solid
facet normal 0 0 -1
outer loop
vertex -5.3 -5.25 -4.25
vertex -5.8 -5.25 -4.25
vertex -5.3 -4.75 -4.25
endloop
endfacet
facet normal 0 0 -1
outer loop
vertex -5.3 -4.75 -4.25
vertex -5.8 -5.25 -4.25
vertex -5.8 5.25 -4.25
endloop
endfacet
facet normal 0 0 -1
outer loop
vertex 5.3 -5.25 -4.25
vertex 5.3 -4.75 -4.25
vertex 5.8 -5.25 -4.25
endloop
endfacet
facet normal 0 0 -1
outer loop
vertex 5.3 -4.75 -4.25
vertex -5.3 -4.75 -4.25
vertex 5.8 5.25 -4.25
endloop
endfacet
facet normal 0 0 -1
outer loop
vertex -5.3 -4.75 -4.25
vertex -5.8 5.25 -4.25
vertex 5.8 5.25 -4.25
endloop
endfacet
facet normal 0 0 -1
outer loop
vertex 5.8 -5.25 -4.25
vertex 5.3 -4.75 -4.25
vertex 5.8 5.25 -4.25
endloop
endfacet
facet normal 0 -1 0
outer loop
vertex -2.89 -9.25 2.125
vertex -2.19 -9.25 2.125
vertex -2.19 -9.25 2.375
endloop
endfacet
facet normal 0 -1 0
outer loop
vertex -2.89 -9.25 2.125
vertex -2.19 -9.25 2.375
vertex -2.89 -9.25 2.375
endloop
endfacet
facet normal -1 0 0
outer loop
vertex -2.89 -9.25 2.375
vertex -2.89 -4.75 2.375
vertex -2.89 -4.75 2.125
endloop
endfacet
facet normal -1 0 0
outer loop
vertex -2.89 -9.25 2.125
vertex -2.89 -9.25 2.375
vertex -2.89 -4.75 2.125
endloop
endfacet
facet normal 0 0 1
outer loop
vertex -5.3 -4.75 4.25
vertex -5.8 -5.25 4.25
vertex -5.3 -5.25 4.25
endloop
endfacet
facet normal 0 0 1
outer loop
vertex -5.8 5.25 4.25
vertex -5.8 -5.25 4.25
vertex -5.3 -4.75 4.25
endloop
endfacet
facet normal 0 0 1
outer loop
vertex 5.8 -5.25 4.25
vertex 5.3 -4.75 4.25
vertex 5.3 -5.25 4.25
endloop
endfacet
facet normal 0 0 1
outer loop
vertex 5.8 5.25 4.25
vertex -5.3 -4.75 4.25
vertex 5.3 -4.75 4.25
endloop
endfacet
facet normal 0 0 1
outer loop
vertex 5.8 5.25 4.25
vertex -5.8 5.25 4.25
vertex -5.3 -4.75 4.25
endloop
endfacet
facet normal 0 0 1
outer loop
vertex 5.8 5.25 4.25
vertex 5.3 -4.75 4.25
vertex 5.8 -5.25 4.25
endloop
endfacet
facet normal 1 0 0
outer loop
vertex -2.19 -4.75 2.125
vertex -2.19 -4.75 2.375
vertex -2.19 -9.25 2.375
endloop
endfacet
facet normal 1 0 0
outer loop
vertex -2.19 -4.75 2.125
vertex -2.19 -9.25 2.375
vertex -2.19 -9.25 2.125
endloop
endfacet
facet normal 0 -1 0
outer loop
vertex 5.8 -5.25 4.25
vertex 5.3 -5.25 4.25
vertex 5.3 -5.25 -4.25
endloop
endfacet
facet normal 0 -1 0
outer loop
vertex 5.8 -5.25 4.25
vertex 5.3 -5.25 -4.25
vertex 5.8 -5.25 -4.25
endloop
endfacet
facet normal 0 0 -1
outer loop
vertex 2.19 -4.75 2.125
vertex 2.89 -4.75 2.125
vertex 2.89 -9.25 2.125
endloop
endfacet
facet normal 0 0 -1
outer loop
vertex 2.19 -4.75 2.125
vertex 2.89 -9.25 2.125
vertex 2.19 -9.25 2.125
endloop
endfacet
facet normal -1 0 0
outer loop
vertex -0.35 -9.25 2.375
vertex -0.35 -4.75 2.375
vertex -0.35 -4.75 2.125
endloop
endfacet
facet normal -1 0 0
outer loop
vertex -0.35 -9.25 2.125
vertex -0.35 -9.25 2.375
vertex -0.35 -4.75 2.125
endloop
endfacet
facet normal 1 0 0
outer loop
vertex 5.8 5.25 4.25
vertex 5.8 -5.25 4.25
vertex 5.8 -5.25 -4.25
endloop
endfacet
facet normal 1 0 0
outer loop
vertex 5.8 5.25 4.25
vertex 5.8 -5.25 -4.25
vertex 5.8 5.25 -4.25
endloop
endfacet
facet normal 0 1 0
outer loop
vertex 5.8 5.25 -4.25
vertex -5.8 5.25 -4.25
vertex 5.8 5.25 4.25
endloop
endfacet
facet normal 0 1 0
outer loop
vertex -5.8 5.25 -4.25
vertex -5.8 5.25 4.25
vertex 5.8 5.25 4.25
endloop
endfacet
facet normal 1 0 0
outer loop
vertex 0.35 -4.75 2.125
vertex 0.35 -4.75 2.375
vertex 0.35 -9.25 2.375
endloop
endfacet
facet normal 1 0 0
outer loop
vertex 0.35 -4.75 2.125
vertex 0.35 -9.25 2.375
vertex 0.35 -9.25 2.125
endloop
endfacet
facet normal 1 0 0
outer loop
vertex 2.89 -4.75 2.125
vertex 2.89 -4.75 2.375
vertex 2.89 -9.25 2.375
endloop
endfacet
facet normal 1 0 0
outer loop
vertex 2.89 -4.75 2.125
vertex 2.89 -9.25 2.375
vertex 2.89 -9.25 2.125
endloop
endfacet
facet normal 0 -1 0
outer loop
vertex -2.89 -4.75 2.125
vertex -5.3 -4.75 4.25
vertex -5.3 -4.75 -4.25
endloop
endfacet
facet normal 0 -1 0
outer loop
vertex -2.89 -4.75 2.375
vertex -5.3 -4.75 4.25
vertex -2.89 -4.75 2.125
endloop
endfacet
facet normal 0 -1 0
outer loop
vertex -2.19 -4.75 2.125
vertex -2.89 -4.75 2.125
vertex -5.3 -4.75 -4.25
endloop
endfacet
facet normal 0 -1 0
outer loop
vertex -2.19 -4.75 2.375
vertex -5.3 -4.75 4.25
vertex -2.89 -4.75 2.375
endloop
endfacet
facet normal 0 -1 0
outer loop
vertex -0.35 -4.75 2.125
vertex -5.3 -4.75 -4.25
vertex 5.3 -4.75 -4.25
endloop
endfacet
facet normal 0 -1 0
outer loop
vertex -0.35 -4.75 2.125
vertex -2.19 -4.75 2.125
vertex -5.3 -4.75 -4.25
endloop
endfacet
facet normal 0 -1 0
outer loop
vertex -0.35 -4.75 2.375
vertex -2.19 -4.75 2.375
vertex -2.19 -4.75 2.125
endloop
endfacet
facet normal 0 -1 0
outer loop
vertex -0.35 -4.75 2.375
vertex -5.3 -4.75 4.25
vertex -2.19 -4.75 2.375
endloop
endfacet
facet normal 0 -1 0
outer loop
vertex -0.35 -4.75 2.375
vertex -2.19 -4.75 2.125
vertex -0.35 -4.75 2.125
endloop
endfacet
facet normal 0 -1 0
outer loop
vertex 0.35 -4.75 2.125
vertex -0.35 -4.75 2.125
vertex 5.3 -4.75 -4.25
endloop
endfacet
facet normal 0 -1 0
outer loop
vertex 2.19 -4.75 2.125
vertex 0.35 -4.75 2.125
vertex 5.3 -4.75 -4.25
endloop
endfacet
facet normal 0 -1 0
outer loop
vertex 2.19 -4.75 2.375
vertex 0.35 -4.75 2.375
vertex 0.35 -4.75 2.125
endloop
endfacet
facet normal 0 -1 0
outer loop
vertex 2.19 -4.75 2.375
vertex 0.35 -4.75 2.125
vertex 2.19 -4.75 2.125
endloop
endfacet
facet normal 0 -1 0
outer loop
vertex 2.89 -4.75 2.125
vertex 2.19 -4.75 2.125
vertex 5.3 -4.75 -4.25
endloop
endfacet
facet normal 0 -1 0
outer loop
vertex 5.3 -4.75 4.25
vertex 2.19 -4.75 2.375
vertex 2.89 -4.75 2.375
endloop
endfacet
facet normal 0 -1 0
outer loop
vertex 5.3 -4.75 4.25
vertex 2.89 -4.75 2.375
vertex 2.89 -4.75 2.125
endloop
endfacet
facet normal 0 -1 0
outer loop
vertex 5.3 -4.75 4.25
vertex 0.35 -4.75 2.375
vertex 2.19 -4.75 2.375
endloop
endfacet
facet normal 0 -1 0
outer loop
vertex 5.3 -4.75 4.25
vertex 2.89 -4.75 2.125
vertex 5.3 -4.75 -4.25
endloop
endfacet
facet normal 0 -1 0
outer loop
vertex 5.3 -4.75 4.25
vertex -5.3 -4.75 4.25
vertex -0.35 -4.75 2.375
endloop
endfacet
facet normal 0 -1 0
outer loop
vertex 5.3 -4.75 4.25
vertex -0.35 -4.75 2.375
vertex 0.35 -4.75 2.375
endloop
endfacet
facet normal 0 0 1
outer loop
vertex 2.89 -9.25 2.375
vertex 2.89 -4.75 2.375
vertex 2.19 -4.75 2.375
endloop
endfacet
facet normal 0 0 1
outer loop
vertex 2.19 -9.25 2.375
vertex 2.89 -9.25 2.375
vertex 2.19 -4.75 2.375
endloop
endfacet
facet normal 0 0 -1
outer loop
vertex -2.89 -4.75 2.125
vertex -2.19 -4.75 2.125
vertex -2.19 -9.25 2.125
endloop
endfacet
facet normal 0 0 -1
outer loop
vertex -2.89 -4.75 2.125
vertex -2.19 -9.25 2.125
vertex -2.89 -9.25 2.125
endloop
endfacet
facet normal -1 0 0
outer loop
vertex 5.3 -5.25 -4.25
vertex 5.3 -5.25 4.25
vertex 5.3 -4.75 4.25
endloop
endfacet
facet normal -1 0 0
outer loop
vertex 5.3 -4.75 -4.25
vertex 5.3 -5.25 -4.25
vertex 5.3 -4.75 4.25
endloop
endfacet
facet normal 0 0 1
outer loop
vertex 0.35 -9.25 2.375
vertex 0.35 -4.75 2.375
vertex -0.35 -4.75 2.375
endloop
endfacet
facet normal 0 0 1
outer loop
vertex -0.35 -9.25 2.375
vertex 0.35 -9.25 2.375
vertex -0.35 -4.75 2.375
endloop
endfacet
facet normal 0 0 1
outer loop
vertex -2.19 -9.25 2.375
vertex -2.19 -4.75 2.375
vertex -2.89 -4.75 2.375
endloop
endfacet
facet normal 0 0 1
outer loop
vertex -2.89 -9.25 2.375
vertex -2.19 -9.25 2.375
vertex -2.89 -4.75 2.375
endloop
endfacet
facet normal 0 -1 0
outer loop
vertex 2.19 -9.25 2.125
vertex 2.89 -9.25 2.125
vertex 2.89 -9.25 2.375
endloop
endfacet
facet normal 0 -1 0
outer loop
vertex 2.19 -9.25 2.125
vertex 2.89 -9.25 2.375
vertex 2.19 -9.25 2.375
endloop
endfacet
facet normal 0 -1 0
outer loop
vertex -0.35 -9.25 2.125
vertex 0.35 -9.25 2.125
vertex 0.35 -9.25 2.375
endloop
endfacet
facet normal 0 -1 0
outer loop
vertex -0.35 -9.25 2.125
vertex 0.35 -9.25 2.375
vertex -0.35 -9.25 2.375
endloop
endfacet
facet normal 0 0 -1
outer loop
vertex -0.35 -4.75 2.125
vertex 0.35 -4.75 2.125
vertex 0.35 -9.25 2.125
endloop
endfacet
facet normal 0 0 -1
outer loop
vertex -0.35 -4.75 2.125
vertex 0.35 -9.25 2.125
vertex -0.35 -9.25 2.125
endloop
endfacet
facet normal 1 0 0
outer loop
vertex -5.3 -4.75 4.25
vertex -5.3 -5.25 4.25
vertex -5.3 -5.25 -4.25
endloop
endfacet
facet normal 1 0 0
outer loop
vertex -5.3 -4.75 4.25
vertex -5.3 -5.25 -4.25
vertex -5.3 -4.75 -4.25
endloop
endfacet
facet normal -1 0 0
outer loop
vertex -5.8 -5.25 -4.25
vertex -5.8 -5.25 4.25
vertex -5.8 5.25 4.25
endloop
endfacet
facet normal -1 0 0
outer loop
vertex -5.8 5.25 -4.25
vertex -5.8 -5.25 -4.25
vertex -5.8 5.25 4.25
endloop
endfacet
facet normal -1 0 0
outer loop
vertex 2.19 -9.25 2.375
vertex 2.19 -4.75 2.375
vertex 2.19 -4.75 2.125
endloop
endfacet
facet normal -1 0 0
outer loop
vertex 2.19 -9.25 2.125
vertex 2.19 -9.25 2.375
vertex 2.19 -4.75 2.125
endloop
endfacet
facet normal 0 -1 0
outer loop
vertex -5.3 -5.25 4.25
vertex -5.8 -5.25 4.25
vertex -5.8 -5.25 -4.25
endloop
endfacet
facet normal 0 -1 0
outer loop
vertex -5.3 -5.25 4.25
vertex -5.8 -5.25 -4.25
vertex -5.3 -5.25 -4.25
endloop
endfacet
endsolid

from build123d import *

# Parameters (mm, degrees)
SKETCH1_W           = 11.6
SKETCH1_H           = 10.5
BOSS_EXTRUDE1_DEPTH = 4.25
SKETCH2_W           = 10.6
SKETCH2_H           = 0.5
CUT_EXTRUDE1_DEPTH  = 12.552164299
SKETCH3_W           = 0.7
SKETCH3_H           = 0.25
BOSS_EXTRUDE2_DEPTH = 4.5


with BuildPart() as part:
    # Sketch1 → Boss-Extrude1 (new, symmetric)
    with BuildSketch(Plane.XY):
        Rectangle(SKETCH1_W, SKETCH1_H)
    extrude(amount=BOSS_EXTRUDE1_DEPTH, both=True)

    # Sketch2 → Cut-Extrude1 (cut, through all)
    with BuildSketch(Plane.XY.offset(4.25)):
        with Locations((0, -5)):
            Rectangle(SKETCH2_W, SKETCH2_H)
    extrude(amount=-CUT_EXTRUDE1_DEPTH, mode=Mode.SUBTRACT)

    # Sketch3 → Boss-Extrude2 (add)
    with BuildSketch(Plane(origin=(0, -4.75, 0), x_dir=(-1, 0, 0), z_dir=(0, -1, 0))):
        with Locations((0, -2.25)):
            Rectangle(SKETCH3_W, SKETCH3_H)
        with Locations((2.54, -2.25)):
            Rectangle(SKETCH3_W, SKETCH3_H)
        with Locations((-2.54, -2.25)):
            Rectangle(SKETCH3_W, SKETCH3_H)
    extrude(amount=BOSS_EXTRUDE2_DEPTH)


solid = part.part
